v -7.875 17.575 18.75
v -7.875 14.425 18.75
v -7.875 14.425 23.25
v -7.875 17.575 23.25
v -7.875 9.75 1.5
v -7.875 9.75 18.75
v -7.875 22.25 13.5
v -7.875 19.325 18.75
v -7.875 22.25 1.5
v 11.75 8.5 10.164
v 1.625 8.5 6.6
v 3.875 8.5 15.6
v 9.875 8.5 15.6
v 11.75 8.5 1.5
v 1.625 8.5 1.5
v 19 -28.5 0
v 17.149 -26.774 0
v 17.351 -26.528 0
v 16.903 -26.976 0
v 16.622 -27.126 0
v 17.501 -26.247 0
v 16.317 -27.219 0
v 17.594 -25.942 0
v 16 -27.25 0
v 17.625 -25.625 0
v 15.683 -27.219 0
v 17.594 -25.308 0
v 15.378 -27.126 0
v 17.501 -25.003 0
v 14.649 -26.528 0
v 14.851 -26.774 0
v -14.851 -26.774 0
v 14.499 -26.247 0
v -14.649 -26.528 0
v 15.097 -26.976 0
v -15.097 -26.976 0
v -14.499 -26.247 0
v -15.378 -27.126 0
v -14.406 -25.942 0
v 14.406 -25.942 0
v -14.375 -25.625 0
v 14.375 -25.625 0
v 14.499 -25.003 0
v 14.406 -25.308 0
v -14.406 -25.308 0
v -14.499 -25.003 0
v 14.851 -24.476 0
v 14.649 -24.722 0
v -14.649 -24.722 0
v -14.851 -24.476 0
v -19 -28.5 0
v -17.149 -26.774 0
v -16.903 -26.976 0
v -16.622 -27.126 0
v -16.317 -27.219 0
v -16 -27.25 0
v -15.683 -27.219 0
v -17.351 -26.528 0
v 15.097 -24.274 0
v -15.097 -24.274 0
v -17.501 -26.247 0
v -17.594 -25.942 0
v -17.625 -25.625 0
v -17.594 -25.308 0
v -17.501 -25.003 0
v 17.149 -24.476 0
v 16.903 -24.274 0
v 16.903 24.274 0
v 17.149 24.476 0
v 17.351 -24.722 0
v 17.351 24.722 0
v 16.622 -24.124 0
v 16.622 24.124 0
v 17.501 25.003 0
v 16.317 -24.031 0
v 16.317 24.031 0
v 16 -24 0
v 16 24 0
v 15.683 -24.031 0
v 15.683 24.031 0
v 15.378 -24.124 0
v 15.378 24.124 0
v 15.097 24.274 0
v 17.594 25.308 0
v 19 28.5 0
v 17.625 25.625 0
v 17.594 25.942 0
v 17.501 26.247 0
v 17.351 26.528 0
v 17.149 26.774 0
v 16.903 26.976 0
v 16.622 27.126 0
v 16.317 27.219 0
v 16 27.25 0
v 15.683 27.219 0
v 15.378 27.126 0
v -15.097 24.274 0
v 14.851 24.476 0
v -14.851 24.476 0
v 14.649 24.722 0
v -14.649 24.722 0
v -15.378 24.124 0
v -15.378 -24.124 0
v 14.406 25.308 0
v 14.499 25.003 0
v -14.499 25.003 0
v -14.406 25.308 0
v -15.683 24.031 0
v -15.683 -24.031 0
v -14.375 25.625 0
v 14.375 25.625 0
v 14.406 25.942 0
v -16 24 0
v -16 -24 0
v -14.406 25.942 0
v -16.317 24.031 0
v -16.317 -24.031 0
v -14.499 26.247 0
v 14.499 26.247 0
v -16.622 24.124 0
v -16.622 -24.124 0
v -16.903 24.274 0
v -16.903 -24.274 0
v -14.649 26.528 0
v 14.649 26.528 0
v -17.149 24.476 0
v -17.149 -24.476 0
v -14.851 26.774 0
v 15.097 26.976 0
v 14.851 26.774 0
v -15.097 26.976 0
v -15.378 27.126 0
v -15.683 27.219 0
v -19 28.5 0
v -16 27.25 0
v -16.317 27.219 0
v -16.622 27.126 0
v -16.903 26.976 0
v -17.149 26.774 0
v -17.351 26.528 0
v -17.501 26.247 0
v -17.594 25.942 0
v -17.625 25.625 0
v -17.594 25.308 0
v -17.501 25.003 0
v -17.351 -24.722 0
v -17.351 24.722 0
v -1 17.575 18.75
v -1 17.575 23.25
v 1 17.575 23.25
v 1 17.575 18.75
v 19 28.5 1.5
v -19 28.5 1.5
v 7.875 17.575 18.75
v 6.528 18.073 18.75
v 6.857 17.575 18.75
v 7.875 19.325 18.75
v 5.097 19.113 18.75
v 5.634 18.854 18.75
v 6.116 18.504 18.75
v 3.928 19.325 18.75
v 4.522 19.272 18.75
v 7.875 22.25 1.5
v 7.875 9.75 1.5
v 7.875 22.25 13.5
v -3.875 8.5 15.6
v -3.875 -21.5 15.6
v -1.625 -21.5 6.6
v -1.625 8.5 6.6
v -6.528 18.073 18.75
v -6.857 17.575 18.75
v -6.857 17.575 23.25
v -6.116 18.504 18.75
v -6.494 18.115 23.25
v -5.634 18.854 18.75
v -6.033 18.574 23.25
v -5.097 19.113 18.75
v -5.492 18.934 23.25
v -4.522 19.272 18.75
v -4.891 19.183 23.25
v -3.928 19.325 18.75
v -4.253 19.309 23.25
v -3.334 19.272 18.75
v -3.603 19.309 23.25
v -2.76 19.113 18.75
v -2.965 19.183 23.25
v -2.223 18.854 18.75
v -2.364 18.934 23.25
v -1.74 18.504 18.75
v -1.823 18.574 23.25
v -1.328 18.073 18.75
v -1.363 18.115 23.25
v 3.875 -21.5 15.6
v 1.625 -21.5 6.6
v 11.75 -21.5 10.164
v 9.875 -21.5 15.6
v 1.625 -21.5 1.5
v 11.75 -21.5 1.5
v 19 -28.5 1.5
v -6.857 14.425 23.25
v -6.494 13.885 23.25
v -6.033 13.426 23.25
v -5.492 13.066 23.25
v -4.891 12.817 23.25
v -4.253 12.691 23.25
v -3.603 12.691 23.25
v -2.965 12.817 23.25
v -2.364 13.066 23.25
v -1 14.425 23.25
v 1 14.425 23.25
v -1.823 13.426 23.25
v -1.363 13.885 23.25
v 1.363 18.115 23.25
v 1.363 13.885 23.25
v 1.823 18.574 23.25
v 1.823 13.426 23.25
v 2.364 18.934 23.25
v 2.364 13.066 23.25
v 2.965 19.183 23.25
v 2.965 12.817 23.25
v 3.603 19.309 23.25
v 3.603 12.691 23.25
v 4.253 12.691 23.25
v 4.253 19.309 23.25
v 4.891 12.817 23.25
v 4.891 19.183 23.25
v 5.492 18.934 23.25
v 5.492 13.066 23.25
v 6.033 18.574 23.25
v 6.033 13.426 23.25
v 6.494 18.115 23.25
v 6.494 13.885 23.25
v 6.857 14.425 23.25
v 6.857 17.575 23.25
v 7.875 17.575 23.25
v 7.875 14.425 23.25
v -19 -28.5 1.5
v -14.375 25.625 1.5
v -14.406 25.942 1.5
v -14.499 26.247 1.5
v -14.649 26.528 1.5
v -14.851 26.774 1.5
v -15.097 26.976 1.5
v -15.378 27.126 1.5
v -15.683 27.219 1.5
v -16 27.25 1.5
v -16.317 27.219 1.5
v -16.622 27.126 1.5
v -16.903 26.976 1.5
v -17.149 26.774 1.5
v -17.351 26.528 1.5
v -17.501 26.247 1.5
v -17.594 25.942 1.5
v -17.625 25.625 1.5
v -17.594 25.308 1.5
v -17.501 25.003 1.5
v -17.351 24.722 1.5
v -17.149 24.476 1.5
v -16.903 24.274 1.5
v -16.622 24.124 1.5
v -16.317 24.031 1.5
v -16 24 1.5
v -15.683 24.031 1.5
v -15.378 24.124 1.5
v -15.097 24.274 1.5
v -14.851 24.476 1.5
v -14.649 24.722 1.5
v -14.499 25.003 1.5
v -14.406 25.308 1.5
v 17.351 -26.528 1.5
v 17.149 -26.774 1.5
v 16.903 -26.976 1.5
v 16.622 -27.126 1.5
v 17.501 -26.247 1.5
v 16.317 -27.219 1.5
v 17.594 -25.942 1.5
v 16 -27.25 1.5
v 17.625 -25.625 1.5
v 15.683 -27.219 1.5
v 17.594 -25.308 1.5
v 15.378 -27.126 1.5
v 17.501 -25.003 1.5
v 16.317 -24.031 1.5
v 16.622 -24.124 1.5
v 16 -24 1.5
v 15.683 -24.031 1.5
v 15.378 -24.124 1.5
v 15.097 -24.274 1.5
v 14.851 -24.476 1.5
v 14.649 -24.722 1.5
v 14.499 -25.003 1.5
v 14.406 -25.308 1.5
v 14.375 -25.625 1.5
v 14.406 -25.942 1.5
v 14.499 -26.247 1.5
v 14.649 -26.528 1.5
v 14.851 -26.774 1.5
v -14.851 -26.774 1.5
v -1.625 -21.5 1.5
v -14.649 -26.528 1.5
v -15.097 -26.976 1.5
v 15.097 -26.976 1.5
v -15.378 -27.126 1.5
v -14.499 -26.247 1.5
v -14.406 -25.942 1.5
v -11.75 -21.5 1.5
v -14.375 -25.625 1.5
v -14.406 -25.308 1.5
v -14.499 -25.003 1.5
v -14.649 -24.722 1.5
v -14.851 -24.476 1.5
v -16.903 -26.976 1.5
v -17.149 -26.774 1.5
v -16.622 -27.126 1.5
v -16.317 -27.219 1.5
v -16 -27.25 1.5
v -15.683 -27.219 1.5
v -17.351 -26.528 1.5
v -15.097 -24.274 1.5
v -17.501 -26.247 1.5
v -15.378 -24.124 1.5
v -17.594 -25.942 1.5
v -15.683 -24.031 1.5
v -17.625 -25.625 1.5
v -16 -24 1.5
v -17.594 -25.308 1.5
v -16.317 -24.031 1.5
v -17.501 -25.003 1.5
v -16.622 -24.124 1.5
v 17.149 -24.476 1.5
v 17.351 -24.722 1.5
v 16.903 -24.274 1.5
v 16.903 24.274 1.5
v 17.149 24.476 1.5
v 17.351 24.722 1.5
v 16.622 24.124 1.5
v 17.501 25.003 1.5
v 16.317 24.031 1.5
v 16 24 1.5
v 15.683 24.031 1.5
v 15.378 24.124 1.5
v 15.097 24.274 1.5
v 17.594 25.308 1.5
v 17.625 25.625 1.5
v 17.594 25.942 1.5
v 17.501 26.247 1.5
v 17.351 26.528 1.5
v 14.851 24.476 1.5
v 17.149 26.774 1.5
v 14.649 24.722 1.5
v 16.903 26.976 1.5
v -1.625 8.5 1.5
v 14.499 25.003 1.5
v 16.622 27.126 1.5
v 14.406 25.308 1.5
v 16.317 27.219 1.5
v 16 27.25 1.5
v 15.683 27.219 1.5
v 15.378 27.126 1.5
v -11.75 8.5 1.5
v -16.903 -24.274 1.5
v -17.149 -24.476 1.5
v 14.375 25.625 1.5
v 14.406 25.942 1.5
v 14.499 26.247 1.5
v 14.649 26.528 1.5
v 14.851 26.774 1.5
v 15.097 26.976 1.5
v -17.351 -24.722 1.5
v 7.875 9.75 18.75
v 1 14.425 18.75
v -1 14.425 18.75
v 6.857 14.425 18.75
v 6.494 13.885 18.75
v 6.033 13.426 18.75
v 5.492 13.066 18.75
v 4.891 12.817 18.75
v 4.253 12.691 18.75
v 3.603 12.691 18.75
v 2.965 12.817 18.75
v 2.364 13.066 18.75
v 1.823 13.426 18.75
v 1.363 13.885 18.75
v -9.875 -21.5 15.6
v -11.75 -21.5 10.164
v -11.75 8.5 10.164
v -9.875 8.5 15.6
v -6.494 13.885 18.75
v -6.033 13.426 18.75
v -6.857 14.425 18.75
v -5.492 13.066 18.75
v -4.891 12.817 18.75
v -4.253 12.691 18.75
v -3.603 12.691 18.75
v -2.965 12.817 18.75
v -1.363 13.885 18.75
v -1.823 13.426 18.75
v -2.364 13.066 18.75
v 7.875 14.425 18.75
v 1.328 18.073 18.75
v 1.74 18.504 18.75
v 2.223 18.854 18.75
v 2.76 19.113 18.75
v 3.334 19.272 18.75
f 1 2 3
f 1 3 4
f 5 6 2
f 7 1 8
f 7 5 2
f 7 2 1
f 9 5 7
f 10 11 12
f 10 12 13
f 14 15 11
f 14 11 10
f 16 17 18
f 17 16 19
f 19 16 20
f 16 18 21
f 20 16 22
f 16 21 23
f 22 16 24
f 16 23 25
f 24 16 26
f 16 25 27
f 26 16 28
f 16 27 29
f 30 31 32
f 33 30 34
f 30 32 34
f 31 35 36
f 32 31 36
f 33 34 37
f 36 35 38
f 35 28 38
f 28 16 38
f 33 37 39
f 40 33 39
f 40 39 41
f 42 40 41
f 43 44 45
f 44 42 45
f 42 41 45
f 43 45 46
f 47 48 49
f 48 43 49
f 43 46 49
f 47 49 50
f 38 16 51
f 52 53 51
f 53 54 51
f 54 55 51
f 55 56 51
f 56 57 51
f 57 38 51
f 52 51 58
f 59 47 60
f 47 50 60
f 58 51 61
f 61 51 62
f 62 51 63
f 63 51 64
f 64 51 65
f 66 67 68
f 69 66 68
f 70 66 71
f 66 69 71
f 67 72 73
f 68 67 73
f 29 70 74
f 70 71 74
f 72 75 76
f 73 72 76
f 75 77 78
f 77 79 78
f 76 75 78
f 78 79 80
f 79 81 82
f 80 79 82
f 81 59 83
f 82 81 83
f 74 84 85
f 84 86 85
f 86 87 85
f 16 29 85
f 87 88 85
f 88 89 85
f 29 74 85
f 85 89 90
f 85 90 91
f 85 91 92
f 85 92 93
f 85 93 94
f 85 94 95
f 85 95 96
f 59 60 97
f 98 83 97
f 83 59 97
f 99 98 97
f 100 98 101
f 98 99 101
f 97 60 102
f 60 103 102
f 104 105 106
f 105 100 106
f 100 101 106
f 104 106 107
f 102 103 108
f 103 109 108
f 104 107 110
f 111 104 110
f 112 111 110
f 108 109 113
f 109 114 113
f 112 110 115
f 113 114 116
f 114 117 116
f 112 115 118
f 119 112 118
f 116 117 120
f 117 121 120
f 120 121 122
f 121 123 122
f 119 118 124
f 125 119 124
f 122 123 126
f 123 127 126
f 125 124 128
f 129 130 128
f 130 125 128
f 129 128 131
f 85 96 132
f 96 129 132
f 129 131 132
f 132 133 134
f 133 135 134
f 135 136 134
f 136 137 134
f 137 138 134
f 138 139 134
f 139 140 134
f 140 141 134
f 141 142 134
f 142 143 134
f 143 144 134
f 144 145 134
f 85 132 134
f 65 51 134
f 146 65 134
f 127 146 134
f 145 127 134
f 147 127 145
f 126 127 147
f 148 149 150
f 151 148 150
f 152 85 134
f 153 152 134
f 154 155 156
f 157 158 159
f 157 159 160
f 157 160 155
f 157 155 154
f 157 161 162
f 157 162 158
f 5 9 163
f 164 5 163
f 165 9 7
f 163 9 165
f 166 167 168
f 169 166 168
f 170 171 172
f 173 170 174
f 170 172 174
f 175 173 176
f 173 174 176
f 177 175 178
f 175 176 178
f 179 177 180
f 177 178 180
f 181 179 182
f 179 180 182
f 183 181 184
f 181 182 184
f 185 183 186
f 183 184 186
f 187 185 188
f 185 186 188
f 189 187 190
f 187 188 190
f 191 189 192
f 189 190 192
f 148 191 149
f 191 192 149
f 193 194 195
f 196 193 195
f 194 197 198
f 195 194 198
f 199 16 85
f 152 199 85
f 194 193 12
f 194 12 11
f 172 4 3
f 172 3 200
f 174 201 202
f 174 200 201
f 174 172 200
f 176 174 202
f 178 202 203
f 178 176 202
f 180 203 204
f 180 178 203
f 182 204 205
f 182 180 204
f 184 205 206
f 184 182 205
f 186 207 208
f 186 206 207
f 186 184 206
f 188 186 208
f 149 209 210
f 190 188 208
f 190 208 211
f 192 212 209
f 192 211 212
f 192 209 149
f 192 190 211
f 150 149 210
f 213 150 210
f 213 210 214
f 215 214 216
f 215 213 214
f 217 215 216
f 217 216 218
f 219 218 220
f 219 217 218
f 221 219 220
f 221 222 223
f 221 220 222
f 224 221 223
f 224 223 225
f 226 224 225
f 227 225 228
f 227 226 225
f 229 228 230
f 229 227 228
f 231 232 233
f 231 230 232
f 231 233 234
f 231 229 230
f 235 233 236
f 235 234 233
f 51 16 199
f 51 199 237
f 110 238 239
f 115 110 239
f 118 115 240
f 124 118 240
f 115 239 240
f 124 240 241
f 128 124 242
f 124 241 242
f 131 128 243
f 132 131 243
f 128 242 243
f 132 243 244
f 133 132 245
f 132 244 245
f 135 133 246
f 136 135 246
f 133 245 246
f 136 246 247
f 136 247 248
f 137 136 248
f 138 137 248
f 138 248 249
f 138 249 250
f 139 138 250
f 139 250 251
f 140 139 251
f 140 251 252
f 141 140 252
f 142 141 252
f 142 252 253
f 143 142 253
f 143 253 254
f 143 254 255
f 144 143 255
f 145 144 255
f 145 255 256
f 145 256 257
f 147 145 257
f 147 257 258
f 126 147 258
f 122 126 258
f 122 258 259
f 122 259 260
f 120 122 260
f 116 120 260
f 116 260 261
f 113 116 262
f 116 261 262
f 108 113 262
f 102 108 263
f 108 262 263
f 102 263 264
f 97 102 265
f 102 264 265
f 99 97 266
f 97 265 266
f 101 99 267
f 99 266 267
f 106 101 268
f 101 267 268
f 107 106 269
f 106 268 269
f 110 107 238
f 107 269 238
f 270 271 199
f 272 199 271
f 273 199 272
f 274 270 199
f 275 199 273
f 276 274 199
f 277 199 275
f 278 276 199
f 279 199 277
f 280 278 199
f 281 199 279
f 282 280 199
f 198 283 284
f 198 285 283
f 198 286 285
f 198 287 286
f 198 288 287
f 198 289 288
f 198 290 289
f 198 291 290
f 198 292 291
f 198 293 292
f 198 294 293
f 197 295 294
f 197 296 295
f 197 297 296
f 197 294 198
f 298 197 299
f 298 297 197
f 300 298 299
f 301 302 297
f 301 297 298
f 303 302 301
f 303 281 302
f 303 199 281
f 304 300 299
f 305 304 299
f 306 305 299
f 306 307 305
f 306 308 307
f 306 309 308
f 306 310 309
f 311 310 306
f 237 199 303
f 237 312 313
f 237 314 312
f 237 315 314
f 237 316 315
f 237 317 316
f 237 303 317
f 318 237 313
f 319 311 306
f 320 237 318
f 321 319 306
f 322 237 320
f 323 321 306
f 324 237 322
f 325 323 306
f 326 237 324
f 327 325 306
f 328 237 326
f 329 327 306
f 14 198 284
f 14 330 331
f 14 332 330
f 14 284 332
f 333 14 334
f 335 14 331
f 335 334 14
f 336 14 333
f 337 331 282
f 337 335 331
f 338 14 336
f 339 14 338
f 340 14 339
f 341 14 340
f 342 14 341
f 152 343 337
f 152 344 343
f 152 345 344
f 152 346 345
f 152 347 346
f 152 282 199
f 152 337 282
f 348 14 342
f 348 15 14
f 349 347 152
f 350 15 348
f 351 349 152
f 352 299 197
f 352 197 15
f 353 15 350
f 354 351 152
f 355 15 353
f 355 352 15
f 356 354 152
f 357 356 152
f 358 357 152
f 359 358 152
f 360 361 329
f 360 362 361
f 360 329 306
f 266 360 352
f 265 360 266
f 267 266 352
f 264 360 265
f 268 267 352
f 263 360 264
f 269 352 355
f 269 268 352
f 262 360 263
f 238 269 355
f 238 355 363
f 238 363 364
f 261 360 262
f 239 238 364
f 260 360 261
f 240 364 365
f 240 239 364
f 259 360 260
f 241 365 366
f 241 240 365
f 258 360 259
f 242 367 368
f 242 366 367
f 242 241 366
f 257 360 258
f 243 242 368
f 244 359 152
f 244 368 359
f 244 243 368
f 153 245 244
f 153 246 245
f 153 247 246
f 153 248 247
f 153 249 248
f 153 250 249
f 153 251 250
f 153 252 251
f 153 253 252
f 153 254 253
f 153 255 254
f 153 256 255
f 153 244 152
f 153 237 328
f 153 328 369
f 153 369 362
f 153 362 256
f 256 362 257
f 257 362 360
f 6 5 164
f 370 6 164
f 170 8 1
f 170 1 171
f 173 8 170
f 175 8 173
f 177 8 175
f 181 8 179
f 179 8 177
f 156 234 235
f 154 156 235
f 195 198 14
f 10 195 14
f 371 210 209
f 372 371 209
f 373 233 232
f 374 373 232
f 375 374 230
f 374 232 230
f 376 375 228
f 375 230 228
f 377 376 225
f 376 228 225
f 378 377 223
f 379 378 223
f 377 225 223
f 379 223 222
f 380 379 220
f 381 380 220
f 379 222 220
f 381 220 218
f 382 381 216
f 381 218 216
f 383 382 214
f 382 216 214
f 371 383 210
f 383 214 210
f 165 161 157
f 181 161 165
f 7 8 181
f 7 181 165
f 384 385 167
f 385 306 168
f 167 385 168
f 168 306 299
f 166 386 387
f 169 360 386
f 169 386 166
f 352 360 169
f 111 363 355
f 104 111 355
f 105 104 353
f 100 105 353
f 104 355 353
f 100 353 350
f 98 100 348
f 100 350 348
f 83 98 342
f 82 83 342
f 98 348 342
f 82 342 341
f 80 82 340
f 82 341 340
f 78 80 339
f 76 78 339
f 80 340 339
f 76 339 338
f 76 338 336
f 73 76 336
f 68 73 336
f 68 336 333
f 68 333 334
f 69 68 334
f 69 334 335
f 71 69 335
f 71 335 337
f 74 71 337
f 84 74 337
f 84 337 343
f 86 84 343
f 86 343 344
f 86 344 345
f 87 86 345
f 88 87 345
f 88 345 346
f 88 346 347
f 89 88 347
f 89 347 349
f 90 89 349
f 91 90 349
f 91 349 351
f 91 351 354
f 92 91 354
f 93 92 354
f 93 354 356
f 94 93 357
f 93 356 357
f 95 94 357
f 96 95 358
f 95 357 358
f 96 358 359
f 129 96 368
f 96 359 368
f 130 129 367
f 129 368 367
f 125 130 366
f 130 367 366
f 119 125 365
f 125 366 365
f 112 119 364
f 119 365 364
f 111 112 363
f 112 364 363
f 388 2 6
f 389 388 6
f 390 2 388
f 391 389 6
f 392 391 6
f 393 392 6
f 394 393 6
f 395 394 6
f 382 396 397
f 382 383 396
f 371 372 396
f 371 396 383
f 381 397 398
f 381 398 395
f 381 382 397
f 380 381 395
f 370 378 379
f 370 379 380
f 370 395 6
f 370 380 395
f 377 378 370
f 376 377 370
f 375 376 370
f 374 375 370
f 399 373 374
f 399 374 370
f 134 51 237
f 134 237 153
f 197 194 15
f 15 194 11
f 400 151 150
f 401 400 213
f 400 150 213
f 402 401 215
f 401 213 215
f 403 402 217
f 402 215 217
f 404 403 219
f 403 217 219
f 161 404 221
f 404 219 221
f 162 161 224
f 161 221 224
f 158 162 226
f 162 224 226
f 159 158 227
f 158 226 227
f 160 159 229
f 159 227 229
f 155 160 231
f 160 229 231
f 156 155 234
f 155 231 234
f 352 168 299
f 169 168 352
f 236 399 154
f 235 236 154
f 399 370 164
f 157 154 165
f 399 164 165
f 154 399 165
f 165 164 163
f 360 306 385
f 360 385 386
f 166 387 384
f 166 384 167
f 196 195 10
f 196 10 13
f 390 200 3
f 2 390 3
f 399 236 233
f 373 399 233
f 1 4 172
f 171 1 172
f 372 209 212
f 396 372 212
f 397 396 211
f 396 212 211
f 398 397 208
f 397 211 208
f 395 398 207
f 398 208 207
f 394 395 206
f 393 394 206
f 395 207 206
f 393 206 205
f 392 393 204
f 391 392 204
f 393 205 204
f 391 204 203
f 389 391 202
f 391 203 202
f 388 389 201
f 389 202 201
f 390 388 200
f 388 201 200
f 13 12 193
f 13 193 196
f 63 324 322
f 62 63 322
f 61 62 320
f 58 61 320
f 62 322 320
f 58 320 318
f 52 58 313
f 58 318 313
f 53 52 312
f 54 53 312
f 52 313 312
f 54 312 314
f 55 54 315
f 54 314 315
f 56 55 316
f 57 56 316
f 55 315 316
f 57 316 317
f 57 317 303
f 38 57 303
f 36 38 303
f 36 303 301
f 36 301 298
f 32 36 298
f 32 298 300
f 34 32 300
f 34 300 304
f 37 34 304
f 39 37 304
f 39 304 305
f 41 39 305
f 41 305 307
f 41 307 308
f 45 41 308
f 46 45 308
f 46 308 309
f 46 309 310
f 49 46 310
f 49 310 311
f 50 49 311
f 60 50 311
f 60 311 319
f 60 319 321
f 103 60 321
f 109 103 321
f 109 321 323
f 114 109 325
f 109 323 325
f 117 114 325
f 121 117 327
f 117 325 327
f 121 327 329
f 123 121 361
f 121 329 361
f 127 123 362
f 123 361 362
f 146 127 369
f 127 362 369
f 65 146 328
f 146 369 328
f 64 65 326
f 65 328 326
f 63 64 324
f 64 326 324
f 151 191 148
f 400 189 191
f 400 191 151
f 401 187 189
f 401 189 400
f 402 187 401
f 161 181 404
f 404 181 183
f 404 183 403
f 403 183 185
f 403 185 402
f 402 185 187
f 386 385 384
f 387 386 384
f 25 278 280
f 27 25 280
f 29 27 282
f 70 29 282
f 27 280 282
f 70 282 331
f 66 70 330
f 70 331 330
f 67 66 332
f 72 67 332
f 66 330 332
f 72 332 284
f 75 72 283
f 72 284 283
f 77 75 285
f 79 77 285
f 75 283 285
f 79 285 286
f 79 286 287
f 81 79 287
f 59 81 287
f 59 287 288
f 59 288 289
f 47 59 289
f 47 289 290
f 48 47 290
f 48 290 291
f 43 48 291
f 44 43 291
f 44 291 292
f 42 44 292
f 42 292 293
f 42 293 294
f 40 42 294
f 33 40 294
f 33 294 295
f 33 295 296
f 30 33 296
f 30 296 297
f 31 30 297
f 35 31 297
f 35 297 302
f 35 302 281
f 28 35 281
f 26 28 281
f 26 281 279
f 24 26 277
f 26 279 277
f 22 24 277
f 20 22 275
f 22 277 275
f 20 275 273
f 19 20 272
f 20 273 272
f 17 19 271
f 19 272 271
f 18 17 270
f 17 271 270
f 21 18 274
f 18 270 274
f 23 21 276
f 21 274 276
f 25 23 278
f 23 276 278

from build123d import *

# Parameters (mm, degrees)
SKETCH1_W               = 57
SKETCH1_H               = 38
BOSS_EXTRUDE1_DEPTH     = 1.5
SKETCH2_R               = 1.625
CUT_EXTRUDE1_DEPTH      = 35.285565476
SKETCH3_W               = 23.5
SKETCH3_H               = 30
BOSS_EXTRUDE2_DEPTH     = 14.1
SKETCH4_W               = 3.25
SKETCH4_H               = 30
CUT_EXTRUDE2_DEPTH      = 14.1
CUT_EXTRUDE3_DEPTH      = 56.716783827
SKETCH6_W               = 15.75
SKETCH6_H               = 12.5
BOSS_EXTRUDE3_DEPTH     = 21.75
SKETCH8_OUTSIDE_W       = 54.468
SKETCH8_OUTSIDE_H       = 73.468
CUT_EXTRUDE4_DEPTH      = 4.5
CUT_EXTRUDE5_DEPTH      = 42.398218561
CUT_EXTRUDE5_DEPTH_BACK = 42.398218561


with BuildPart() as part:
    # Sketch1 → Boss-Extrude1 (new body)
    with BuildSketch(Plane(origin=(0, 0, 0), x_dir=(0, 1, 0), z_dir=(0, 0, 1))):
        Rectangle(SKETCH1_W, SKETCH1_H)
    extrude(amount=BOSS_EXTRUDE1_DEPTH)

    # Sketch2 → Cut-Extrude1 (cut, through all)
    with BuildSketch(Plane.XY.offset(1.5)):
        with Locations((-16, 25.625)):
            Circle(SKETCH2_R)
        with Locations(Location((-16, -25.625, 0), (0, 0, 180))):
            Circle(SKETCH2_R)
        with Locations(Location((16, 25.625, 0), (0, 0, 180))):
            Circle(SKETCH2_R)
        with Locations((16, -25.625)):
            Circle(SKETCH2_R)
    extrude(amount=-CUT_EXTRUDE1_DEPTH, mode=Mode.SUBTRACT)

    # Sketch3 → Boss-Extrude2 (add)
    with BuildSketch(Plane.XY.offset(1.5)):
        with Locations((0, -6.5)):
            Rectangle(SKETCH3_W, SKETCH3_H)
    extrude(amount=BOSS_EXTRUDE2_DEPTH)

    # Sketch4 → Cut-Extrude2 (cut)
    with BuildSketch(Plane.XY.offset(15.6)):
        with Locations((0, -6.5)):
            Rectangle(SKETCH4_W, SKETCH4_H)
    extrude(amount=-CUT_EXTRUDE2_DEPTH, mode=Mode.SUBTRACT)

    # Sketch5 → Cut-Extrude3 (cut, through all)
    with BuildSketch(Plane.XZ.offset(21.5)):
        Polygon((-11.75, 10.164296274), (-9.875, 15.6), (-11.75, 15.6), align=None)
        Polygon((-1.625, 15.6), (-3.875, 15.6), (-1.625, 6.6), align=None)
        Polygon((1.625, 6.6), (1.625, 15.6), (3.875, 15.6), align=None)
        Polygon((11.75, 15.6), (11.75, 10.164296274), (9.875, 15.6), align=None)
    extrude(amount=-CUT_EXTRUDE3_DEPTH, mode=Mode.SUBTRACT)


with BuildPart() as body_2:
    # Sketch6 → Boss-Extrude3 (new body)
    with BuildSketch(Plane.XY.offset(1.5)):
        with Locations((0, 16)):
            Rectangle(SKETCH6_W, SKETCH6_H)
    extrude(amount=BOSS_EXTRUDE3_DEPTH)

    # Sketch8 outside → Cut-Extrude4 (cut)
    with BuildSketch(Plane.XY.offset(23.25)):
        Rectangle(SKETCH8_OUTSIDE_W, SKETCH8_OUTSIDE_H)
        with BuildLine():
            Line((-1, 17.575), (1, 17.575))
            ThreePointArc((1, 17.575), (3.928310093, 19.325), (6.856620186, 17.575))
            Line((6.856620186, 17.575), (7.875, 17.575))
            Line((7.875, 17.575), (7.875, 14.425))
            Line((7.875, 14.425), (6.856620186, 14.425))
            ThreePointArc((6.856620186, 14.425), (3.928310093, 12.675), (1, 14.425))
            Line((1, 14.425), (-1, 14.425))
            ThreePointArc((-1, 14.425), (-3.928310093, 12.675), (-6.856620186, 14.425))
            Line((-6.856620186, 14.425), (-7.875, 14.425))
            Line((-7.875, 14.425), (-7.875, 17.575))
            Line((-7.875, 17.575), (-6.856620186, 17.575))
            ThreePointArc((-6.856620186, 17.575), (-3.928310093, 19.325), (-1, 17.575))
        make_face(mode=Mode.SUBTRACT)
    extrude(amount=-CUT_EXTRUDE4_DEPTH, mode=Mode.SUBTRACT)

    # Sketch9 → Cut-Extrude5 (cut, two sides: drawn at the far end of the back side and taken through both)
    with BuildSketch(Plane.YZ.offset(-CUT_EXTRUDE5_DEPTH_BACK)):
        Polygon((19.325, 18.75), (22.25, 13.5), (22.25, 18.75), align=None)
    extrude(amount=CUT_EXTRUDE5_DEPTH + CUT_EXTRUDE5_DEPTH_BACK, mode=Mode.SUBTRACT)


solid = Compound([part.part, body_2.part])
